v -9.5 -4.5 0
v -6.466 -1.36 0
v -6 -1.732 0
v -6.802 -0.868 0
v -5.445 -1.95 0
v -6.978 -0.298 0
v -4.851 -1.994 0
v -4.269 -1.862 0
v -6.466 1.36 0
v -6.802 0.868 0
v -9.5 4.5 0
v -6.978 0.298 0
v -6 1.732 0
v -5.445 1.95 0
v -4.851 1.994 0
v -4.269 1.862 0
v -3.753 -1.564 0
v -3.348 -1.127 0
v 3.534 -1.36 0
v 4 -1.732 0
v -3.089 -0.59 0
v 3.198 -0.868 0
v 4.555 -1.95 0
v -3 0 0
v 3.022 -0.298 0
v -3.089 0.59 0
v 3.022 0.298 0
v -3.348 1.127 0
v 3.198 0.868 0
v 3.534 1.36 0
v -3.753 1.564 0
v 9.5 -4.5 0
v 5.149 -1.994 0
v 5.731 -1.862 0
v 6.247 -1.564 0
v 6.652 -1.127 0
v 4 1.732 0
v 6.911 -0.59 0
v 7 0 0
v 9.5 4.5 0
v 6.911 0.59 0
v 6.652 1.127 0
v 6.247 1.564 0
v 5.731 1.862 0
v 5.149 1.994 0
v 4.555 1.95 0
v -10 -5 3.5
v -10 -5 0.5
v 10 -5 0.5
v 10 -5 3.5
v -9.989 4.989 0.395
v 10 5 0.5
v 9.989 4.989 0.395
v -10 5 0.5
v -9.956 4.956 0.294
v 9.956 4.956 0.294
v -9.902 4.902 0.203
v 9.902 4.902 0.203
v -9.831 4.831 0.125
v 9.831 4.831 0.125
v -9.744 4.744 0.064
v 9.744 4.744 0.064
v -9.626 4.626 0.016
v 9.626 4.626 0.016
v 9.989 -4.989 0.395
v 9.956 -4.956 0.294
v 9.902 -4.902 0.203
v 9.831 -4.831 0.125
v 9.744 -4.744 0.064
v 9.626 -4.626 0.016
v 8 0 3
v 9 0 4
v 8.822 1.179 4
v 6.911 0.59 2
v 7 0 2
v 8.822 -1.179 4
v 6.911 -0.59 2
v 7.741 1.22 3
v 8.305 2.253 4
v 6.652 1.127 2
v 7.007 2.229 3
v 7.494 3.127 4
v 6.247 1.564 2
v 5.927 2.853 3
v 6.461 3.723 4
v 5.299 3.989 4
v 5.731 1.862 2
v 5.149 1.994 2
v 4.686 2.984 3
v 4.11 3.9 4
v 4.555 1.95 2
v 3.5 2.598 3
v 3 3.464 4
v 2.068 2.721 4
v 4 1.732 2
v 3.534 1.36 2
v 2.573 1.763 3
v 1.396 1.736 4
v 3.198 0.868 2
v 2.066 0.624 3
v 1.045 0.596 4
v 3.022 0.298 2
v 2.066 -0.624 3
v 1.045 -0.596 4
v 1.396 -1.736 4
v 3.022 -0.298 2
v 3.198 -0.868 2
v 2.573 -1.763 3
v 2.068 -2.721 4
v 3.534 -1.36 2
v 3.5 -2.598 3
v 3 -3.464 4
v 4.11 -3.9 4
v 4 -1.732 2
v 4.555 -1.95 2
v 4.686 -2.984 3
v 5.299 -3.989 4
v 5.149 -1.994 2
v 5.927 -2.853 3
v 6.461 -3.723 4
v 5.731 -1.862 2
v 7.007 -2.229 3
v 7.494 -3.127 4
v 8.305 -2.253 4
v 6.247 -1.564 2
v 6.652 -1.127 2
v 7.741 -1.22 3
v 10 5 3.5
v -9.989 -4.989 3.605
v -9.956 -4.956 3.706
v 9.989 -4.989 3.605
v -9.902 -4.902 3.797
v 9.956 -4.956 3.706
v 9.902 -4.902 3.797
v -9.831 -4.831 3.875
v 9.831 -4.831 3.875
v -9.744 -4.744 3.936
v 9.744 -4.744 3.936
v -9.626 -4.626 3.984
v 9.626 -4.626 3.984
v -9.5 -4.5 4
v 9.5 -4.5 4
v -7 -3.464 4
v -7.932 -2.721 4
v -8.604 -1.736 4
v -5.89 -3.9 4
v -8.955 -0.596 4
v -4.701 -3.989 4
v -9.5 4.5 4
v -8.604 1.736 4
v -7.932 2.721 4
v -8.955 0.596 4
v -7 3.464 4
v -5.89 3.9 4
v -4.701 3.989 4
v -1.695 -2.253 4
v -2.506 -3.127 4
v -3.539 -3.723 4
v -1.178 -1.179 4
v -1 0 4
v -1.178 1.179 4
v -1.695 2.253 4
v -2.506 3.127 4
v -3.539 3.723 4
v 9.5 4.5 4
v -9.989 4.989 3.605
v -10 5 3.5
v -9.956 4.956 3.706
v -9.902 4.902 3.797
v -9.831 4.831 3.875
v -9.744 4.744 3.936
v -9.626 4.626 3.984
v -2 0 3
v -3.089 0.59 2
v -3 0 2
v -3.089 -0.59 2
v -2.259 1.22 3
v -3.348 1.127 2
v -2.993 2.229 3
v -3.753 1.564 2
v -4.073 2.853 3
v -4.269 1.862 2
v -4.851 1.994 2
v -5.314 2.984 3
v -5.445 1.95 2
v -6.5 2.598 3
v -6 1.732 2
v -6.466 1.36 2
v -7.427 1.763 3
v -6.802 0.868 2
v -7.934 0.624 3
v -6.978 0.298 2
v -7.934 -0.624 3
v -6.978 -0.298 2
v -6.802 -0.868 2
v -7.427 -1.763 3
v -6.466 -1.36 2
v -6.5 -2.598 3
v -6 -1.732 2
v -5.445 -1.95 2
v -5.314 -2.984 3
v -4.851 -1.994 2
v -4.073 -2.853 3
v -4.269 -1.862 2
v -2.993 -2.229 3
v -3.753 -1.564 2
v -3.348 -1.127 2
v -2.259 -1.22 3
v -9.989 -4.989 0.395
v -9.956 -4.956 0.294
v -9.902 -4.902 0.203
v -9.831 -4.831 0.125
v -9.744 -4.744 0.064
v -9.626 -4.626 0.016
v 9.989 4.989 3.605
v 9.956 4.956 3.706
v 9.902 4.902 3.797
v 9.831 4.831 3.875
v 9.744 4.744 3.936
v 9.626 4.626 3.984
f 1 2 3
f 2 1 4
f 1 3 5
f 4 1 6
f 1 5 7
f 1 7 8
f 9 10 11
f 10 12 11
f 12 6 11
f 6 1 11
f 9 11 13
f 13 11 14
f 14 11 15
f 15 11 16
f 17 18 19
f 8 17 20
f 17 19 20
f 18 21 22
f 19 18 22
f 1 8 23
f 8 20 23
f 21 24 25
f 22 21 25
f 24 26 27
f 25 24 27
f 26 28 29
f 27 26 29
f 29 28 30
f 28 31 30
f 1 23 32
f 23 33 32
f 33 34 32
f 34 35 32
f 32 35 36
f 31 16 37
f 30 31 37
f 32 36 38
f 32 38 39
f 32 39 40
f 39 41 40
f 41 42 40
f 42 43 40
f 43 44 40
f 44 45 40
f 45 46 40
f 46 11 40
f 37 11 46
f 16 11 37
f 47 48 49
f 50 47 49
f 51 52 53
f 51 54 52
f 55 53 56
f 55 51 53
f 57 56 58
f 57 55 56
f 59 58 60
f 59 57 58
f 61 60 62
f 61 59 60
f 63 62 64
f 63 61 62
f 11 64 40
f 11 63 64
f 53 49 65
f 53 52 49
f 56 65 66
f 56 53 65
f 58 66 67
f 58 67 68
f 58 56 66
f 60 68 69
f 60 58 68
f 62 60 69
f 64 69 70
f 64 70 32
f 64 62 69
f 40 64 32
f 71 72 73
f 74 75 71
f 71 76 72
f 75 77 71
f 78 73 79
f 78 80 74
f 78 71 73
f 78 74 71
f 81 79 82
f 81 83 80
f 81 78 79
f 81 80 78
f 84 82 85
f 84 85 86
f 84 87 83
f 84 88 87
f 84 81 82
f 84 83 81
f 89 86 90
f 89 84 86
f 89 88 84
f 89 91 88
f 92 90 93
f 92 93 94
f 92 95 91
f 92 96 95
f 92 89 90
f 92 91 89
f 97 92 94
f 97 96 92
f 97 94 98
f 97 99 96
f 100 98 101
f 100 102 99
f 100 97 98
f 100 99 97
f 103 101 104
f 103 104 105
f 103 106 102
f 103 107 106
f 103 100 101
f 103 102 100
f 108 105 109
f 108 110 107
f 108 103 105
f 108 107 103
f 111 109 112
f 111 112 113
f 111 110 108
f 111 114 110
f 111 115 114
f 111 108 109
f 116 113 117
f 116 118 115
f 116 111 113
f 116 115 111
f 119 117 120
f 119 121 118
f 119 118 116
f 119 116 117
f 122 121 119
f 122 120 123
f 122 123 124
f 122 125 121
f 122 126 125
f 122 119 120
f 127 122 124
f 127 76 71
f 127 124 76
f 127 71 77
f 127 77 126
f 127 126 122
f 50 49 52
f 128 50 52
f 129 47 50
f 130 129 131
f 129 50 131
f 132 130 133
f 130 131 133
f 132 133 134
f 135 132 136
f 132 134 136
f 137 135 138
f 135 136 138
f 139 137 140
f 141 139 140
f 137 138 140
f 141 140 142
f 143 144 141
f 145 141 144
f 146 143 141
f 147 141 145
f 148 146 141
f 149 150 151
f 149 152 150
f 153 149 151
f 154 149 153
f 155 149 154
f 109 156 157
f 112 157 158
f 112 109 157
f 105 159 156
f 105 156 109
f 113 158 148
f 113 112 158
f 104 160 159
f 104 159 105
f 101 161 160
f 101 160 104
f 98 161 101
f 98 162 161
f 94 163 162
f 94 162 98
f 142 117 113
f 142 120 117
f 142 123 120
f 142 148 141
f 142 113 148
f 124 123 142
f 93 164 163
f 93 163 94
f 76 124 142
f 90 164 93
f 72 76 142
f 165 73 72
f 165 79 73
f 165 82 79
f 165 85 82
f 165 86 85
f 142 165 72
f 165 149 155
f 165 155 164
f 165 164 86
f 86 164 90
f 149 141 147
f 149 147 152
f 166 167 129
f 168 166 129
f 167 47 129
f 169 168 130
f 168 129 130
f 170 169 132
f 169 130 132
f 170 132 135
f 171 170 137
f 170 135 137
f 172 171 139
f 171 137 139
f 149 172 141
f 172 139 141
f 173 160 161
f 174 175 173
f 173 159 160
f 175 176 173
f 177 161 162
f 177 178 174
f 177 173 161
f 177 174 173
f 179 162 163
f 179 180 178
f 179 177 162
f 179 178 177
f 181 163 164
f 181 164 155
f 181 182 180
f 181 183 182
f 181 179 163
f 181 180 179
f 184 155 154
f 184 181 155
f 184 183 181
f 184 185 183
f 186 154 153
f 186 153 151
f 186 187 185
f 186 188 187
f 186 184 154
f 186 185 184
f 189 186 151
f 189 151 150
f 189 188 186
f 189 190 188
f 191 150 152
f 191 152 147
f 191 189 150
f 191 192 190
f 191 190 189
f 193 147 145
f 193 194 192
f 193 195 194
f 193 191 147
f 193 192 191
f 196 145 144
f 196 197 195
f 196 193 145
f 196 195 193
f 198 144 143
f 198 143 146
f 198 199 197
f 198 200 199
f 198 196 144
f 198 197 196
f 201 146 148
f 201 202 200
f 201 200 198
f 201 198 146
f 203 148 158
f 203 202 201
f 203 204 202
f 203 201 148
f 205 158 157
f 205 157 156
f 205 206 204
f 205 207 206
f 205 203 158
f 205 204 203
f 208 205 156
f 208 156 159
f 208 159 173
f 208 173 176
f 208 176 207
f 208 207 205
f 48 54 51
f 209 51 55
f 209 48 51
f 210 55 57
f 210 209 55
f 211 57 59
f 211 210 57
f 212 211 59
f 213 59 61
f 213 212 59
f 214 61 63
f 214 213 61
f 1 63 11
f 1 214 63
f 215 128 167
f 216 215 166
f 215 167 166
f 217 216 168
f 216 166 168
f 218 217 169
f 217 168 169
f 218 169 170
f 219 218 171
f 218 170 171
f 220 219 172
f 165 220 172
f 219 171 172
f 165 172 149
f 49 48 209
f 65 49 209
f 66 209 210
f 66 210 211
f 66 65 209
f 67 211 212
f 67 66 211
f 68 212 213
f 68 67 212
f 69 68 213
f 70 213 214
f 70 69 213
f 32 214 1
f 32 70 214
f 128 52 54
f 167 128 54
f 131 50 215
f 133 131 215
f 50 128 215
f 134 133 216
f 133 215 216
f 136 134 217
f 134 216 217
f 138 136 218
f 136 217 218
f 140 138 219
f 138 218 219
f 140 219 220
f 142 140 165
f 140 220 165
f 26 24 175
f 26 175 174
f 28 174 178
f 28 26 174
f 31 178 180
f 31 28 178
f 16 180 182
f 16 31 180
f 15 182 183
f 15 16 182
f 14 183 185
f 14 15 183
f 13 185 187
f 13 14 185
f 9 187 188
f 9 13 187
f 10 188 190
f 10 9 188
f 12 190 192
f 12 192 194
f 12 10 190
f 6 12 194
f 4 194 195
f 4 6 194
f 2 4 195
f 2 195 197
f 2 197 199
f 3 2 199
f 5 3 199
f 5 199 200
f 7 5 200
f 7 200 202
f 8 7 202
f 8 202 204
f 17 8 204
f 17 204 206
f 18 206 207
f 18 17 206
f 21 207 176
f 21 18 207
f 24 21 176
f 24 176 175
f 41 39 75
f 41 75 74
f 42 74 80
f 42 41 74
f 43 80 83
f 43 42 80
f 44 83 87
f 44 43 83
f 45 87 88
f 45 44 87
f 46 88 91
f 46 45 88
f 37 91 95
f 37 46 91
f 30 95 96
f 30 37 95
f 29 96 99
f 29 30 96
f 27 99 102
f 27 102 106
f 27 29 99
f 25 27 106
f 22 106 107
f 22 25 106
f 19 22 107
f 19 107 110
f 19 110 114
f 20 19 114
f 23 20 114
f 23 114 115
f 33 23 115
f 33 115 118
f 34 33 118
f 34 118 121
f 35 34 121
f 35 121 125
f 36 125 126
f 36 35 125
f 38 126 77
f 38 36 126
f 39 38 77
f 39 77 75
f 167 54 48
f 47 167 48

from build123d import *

# Parameters (mm, degrees)
F0_R     = 2
F1_DEPTH = 4
F2_R     = 0.5
F3_SIZE  = 2


with BuildPart() as f1:
    # F0 (on Top) → F1 (new body)
    with BuildSketch(Plane.XY):
        Polygon((0, -5), (10, -5), (10, 5), (0, 5), (-10, 5), (-10, -5), align=None)
        with Locations((-5, 0)):
            Circle(F0_R, mode=Mode.SUBTRACT)
        with Locations((5, 0)):
            Circle(F0_R, mode=Mode.SUBTRACT)
    extrude(amount=F1_DEPTH)

    # F2
    f2_edges = [f1.edges().sort_by_distance(p)[0] for p in [
        (0, -5, 4),
        (-10, 0, 4),
        (0, 5, 4),
        (10, 0, 4),
        (-10, 0, 0),
        (0, -5, 0),
        (10, 0, 0),
        (0, 5, 0),
    ]]
    fillet(f2_edges, radius=F2_R)

    # F3
    f3_edges = [f1.edges().sort_by_distance(p)[0] for p in [
        (3, 0, 4),
        (-7, 0, 4),
    ]]
    chamfer(f3_edges, length=F3_SIZE)


solid = f1.part
